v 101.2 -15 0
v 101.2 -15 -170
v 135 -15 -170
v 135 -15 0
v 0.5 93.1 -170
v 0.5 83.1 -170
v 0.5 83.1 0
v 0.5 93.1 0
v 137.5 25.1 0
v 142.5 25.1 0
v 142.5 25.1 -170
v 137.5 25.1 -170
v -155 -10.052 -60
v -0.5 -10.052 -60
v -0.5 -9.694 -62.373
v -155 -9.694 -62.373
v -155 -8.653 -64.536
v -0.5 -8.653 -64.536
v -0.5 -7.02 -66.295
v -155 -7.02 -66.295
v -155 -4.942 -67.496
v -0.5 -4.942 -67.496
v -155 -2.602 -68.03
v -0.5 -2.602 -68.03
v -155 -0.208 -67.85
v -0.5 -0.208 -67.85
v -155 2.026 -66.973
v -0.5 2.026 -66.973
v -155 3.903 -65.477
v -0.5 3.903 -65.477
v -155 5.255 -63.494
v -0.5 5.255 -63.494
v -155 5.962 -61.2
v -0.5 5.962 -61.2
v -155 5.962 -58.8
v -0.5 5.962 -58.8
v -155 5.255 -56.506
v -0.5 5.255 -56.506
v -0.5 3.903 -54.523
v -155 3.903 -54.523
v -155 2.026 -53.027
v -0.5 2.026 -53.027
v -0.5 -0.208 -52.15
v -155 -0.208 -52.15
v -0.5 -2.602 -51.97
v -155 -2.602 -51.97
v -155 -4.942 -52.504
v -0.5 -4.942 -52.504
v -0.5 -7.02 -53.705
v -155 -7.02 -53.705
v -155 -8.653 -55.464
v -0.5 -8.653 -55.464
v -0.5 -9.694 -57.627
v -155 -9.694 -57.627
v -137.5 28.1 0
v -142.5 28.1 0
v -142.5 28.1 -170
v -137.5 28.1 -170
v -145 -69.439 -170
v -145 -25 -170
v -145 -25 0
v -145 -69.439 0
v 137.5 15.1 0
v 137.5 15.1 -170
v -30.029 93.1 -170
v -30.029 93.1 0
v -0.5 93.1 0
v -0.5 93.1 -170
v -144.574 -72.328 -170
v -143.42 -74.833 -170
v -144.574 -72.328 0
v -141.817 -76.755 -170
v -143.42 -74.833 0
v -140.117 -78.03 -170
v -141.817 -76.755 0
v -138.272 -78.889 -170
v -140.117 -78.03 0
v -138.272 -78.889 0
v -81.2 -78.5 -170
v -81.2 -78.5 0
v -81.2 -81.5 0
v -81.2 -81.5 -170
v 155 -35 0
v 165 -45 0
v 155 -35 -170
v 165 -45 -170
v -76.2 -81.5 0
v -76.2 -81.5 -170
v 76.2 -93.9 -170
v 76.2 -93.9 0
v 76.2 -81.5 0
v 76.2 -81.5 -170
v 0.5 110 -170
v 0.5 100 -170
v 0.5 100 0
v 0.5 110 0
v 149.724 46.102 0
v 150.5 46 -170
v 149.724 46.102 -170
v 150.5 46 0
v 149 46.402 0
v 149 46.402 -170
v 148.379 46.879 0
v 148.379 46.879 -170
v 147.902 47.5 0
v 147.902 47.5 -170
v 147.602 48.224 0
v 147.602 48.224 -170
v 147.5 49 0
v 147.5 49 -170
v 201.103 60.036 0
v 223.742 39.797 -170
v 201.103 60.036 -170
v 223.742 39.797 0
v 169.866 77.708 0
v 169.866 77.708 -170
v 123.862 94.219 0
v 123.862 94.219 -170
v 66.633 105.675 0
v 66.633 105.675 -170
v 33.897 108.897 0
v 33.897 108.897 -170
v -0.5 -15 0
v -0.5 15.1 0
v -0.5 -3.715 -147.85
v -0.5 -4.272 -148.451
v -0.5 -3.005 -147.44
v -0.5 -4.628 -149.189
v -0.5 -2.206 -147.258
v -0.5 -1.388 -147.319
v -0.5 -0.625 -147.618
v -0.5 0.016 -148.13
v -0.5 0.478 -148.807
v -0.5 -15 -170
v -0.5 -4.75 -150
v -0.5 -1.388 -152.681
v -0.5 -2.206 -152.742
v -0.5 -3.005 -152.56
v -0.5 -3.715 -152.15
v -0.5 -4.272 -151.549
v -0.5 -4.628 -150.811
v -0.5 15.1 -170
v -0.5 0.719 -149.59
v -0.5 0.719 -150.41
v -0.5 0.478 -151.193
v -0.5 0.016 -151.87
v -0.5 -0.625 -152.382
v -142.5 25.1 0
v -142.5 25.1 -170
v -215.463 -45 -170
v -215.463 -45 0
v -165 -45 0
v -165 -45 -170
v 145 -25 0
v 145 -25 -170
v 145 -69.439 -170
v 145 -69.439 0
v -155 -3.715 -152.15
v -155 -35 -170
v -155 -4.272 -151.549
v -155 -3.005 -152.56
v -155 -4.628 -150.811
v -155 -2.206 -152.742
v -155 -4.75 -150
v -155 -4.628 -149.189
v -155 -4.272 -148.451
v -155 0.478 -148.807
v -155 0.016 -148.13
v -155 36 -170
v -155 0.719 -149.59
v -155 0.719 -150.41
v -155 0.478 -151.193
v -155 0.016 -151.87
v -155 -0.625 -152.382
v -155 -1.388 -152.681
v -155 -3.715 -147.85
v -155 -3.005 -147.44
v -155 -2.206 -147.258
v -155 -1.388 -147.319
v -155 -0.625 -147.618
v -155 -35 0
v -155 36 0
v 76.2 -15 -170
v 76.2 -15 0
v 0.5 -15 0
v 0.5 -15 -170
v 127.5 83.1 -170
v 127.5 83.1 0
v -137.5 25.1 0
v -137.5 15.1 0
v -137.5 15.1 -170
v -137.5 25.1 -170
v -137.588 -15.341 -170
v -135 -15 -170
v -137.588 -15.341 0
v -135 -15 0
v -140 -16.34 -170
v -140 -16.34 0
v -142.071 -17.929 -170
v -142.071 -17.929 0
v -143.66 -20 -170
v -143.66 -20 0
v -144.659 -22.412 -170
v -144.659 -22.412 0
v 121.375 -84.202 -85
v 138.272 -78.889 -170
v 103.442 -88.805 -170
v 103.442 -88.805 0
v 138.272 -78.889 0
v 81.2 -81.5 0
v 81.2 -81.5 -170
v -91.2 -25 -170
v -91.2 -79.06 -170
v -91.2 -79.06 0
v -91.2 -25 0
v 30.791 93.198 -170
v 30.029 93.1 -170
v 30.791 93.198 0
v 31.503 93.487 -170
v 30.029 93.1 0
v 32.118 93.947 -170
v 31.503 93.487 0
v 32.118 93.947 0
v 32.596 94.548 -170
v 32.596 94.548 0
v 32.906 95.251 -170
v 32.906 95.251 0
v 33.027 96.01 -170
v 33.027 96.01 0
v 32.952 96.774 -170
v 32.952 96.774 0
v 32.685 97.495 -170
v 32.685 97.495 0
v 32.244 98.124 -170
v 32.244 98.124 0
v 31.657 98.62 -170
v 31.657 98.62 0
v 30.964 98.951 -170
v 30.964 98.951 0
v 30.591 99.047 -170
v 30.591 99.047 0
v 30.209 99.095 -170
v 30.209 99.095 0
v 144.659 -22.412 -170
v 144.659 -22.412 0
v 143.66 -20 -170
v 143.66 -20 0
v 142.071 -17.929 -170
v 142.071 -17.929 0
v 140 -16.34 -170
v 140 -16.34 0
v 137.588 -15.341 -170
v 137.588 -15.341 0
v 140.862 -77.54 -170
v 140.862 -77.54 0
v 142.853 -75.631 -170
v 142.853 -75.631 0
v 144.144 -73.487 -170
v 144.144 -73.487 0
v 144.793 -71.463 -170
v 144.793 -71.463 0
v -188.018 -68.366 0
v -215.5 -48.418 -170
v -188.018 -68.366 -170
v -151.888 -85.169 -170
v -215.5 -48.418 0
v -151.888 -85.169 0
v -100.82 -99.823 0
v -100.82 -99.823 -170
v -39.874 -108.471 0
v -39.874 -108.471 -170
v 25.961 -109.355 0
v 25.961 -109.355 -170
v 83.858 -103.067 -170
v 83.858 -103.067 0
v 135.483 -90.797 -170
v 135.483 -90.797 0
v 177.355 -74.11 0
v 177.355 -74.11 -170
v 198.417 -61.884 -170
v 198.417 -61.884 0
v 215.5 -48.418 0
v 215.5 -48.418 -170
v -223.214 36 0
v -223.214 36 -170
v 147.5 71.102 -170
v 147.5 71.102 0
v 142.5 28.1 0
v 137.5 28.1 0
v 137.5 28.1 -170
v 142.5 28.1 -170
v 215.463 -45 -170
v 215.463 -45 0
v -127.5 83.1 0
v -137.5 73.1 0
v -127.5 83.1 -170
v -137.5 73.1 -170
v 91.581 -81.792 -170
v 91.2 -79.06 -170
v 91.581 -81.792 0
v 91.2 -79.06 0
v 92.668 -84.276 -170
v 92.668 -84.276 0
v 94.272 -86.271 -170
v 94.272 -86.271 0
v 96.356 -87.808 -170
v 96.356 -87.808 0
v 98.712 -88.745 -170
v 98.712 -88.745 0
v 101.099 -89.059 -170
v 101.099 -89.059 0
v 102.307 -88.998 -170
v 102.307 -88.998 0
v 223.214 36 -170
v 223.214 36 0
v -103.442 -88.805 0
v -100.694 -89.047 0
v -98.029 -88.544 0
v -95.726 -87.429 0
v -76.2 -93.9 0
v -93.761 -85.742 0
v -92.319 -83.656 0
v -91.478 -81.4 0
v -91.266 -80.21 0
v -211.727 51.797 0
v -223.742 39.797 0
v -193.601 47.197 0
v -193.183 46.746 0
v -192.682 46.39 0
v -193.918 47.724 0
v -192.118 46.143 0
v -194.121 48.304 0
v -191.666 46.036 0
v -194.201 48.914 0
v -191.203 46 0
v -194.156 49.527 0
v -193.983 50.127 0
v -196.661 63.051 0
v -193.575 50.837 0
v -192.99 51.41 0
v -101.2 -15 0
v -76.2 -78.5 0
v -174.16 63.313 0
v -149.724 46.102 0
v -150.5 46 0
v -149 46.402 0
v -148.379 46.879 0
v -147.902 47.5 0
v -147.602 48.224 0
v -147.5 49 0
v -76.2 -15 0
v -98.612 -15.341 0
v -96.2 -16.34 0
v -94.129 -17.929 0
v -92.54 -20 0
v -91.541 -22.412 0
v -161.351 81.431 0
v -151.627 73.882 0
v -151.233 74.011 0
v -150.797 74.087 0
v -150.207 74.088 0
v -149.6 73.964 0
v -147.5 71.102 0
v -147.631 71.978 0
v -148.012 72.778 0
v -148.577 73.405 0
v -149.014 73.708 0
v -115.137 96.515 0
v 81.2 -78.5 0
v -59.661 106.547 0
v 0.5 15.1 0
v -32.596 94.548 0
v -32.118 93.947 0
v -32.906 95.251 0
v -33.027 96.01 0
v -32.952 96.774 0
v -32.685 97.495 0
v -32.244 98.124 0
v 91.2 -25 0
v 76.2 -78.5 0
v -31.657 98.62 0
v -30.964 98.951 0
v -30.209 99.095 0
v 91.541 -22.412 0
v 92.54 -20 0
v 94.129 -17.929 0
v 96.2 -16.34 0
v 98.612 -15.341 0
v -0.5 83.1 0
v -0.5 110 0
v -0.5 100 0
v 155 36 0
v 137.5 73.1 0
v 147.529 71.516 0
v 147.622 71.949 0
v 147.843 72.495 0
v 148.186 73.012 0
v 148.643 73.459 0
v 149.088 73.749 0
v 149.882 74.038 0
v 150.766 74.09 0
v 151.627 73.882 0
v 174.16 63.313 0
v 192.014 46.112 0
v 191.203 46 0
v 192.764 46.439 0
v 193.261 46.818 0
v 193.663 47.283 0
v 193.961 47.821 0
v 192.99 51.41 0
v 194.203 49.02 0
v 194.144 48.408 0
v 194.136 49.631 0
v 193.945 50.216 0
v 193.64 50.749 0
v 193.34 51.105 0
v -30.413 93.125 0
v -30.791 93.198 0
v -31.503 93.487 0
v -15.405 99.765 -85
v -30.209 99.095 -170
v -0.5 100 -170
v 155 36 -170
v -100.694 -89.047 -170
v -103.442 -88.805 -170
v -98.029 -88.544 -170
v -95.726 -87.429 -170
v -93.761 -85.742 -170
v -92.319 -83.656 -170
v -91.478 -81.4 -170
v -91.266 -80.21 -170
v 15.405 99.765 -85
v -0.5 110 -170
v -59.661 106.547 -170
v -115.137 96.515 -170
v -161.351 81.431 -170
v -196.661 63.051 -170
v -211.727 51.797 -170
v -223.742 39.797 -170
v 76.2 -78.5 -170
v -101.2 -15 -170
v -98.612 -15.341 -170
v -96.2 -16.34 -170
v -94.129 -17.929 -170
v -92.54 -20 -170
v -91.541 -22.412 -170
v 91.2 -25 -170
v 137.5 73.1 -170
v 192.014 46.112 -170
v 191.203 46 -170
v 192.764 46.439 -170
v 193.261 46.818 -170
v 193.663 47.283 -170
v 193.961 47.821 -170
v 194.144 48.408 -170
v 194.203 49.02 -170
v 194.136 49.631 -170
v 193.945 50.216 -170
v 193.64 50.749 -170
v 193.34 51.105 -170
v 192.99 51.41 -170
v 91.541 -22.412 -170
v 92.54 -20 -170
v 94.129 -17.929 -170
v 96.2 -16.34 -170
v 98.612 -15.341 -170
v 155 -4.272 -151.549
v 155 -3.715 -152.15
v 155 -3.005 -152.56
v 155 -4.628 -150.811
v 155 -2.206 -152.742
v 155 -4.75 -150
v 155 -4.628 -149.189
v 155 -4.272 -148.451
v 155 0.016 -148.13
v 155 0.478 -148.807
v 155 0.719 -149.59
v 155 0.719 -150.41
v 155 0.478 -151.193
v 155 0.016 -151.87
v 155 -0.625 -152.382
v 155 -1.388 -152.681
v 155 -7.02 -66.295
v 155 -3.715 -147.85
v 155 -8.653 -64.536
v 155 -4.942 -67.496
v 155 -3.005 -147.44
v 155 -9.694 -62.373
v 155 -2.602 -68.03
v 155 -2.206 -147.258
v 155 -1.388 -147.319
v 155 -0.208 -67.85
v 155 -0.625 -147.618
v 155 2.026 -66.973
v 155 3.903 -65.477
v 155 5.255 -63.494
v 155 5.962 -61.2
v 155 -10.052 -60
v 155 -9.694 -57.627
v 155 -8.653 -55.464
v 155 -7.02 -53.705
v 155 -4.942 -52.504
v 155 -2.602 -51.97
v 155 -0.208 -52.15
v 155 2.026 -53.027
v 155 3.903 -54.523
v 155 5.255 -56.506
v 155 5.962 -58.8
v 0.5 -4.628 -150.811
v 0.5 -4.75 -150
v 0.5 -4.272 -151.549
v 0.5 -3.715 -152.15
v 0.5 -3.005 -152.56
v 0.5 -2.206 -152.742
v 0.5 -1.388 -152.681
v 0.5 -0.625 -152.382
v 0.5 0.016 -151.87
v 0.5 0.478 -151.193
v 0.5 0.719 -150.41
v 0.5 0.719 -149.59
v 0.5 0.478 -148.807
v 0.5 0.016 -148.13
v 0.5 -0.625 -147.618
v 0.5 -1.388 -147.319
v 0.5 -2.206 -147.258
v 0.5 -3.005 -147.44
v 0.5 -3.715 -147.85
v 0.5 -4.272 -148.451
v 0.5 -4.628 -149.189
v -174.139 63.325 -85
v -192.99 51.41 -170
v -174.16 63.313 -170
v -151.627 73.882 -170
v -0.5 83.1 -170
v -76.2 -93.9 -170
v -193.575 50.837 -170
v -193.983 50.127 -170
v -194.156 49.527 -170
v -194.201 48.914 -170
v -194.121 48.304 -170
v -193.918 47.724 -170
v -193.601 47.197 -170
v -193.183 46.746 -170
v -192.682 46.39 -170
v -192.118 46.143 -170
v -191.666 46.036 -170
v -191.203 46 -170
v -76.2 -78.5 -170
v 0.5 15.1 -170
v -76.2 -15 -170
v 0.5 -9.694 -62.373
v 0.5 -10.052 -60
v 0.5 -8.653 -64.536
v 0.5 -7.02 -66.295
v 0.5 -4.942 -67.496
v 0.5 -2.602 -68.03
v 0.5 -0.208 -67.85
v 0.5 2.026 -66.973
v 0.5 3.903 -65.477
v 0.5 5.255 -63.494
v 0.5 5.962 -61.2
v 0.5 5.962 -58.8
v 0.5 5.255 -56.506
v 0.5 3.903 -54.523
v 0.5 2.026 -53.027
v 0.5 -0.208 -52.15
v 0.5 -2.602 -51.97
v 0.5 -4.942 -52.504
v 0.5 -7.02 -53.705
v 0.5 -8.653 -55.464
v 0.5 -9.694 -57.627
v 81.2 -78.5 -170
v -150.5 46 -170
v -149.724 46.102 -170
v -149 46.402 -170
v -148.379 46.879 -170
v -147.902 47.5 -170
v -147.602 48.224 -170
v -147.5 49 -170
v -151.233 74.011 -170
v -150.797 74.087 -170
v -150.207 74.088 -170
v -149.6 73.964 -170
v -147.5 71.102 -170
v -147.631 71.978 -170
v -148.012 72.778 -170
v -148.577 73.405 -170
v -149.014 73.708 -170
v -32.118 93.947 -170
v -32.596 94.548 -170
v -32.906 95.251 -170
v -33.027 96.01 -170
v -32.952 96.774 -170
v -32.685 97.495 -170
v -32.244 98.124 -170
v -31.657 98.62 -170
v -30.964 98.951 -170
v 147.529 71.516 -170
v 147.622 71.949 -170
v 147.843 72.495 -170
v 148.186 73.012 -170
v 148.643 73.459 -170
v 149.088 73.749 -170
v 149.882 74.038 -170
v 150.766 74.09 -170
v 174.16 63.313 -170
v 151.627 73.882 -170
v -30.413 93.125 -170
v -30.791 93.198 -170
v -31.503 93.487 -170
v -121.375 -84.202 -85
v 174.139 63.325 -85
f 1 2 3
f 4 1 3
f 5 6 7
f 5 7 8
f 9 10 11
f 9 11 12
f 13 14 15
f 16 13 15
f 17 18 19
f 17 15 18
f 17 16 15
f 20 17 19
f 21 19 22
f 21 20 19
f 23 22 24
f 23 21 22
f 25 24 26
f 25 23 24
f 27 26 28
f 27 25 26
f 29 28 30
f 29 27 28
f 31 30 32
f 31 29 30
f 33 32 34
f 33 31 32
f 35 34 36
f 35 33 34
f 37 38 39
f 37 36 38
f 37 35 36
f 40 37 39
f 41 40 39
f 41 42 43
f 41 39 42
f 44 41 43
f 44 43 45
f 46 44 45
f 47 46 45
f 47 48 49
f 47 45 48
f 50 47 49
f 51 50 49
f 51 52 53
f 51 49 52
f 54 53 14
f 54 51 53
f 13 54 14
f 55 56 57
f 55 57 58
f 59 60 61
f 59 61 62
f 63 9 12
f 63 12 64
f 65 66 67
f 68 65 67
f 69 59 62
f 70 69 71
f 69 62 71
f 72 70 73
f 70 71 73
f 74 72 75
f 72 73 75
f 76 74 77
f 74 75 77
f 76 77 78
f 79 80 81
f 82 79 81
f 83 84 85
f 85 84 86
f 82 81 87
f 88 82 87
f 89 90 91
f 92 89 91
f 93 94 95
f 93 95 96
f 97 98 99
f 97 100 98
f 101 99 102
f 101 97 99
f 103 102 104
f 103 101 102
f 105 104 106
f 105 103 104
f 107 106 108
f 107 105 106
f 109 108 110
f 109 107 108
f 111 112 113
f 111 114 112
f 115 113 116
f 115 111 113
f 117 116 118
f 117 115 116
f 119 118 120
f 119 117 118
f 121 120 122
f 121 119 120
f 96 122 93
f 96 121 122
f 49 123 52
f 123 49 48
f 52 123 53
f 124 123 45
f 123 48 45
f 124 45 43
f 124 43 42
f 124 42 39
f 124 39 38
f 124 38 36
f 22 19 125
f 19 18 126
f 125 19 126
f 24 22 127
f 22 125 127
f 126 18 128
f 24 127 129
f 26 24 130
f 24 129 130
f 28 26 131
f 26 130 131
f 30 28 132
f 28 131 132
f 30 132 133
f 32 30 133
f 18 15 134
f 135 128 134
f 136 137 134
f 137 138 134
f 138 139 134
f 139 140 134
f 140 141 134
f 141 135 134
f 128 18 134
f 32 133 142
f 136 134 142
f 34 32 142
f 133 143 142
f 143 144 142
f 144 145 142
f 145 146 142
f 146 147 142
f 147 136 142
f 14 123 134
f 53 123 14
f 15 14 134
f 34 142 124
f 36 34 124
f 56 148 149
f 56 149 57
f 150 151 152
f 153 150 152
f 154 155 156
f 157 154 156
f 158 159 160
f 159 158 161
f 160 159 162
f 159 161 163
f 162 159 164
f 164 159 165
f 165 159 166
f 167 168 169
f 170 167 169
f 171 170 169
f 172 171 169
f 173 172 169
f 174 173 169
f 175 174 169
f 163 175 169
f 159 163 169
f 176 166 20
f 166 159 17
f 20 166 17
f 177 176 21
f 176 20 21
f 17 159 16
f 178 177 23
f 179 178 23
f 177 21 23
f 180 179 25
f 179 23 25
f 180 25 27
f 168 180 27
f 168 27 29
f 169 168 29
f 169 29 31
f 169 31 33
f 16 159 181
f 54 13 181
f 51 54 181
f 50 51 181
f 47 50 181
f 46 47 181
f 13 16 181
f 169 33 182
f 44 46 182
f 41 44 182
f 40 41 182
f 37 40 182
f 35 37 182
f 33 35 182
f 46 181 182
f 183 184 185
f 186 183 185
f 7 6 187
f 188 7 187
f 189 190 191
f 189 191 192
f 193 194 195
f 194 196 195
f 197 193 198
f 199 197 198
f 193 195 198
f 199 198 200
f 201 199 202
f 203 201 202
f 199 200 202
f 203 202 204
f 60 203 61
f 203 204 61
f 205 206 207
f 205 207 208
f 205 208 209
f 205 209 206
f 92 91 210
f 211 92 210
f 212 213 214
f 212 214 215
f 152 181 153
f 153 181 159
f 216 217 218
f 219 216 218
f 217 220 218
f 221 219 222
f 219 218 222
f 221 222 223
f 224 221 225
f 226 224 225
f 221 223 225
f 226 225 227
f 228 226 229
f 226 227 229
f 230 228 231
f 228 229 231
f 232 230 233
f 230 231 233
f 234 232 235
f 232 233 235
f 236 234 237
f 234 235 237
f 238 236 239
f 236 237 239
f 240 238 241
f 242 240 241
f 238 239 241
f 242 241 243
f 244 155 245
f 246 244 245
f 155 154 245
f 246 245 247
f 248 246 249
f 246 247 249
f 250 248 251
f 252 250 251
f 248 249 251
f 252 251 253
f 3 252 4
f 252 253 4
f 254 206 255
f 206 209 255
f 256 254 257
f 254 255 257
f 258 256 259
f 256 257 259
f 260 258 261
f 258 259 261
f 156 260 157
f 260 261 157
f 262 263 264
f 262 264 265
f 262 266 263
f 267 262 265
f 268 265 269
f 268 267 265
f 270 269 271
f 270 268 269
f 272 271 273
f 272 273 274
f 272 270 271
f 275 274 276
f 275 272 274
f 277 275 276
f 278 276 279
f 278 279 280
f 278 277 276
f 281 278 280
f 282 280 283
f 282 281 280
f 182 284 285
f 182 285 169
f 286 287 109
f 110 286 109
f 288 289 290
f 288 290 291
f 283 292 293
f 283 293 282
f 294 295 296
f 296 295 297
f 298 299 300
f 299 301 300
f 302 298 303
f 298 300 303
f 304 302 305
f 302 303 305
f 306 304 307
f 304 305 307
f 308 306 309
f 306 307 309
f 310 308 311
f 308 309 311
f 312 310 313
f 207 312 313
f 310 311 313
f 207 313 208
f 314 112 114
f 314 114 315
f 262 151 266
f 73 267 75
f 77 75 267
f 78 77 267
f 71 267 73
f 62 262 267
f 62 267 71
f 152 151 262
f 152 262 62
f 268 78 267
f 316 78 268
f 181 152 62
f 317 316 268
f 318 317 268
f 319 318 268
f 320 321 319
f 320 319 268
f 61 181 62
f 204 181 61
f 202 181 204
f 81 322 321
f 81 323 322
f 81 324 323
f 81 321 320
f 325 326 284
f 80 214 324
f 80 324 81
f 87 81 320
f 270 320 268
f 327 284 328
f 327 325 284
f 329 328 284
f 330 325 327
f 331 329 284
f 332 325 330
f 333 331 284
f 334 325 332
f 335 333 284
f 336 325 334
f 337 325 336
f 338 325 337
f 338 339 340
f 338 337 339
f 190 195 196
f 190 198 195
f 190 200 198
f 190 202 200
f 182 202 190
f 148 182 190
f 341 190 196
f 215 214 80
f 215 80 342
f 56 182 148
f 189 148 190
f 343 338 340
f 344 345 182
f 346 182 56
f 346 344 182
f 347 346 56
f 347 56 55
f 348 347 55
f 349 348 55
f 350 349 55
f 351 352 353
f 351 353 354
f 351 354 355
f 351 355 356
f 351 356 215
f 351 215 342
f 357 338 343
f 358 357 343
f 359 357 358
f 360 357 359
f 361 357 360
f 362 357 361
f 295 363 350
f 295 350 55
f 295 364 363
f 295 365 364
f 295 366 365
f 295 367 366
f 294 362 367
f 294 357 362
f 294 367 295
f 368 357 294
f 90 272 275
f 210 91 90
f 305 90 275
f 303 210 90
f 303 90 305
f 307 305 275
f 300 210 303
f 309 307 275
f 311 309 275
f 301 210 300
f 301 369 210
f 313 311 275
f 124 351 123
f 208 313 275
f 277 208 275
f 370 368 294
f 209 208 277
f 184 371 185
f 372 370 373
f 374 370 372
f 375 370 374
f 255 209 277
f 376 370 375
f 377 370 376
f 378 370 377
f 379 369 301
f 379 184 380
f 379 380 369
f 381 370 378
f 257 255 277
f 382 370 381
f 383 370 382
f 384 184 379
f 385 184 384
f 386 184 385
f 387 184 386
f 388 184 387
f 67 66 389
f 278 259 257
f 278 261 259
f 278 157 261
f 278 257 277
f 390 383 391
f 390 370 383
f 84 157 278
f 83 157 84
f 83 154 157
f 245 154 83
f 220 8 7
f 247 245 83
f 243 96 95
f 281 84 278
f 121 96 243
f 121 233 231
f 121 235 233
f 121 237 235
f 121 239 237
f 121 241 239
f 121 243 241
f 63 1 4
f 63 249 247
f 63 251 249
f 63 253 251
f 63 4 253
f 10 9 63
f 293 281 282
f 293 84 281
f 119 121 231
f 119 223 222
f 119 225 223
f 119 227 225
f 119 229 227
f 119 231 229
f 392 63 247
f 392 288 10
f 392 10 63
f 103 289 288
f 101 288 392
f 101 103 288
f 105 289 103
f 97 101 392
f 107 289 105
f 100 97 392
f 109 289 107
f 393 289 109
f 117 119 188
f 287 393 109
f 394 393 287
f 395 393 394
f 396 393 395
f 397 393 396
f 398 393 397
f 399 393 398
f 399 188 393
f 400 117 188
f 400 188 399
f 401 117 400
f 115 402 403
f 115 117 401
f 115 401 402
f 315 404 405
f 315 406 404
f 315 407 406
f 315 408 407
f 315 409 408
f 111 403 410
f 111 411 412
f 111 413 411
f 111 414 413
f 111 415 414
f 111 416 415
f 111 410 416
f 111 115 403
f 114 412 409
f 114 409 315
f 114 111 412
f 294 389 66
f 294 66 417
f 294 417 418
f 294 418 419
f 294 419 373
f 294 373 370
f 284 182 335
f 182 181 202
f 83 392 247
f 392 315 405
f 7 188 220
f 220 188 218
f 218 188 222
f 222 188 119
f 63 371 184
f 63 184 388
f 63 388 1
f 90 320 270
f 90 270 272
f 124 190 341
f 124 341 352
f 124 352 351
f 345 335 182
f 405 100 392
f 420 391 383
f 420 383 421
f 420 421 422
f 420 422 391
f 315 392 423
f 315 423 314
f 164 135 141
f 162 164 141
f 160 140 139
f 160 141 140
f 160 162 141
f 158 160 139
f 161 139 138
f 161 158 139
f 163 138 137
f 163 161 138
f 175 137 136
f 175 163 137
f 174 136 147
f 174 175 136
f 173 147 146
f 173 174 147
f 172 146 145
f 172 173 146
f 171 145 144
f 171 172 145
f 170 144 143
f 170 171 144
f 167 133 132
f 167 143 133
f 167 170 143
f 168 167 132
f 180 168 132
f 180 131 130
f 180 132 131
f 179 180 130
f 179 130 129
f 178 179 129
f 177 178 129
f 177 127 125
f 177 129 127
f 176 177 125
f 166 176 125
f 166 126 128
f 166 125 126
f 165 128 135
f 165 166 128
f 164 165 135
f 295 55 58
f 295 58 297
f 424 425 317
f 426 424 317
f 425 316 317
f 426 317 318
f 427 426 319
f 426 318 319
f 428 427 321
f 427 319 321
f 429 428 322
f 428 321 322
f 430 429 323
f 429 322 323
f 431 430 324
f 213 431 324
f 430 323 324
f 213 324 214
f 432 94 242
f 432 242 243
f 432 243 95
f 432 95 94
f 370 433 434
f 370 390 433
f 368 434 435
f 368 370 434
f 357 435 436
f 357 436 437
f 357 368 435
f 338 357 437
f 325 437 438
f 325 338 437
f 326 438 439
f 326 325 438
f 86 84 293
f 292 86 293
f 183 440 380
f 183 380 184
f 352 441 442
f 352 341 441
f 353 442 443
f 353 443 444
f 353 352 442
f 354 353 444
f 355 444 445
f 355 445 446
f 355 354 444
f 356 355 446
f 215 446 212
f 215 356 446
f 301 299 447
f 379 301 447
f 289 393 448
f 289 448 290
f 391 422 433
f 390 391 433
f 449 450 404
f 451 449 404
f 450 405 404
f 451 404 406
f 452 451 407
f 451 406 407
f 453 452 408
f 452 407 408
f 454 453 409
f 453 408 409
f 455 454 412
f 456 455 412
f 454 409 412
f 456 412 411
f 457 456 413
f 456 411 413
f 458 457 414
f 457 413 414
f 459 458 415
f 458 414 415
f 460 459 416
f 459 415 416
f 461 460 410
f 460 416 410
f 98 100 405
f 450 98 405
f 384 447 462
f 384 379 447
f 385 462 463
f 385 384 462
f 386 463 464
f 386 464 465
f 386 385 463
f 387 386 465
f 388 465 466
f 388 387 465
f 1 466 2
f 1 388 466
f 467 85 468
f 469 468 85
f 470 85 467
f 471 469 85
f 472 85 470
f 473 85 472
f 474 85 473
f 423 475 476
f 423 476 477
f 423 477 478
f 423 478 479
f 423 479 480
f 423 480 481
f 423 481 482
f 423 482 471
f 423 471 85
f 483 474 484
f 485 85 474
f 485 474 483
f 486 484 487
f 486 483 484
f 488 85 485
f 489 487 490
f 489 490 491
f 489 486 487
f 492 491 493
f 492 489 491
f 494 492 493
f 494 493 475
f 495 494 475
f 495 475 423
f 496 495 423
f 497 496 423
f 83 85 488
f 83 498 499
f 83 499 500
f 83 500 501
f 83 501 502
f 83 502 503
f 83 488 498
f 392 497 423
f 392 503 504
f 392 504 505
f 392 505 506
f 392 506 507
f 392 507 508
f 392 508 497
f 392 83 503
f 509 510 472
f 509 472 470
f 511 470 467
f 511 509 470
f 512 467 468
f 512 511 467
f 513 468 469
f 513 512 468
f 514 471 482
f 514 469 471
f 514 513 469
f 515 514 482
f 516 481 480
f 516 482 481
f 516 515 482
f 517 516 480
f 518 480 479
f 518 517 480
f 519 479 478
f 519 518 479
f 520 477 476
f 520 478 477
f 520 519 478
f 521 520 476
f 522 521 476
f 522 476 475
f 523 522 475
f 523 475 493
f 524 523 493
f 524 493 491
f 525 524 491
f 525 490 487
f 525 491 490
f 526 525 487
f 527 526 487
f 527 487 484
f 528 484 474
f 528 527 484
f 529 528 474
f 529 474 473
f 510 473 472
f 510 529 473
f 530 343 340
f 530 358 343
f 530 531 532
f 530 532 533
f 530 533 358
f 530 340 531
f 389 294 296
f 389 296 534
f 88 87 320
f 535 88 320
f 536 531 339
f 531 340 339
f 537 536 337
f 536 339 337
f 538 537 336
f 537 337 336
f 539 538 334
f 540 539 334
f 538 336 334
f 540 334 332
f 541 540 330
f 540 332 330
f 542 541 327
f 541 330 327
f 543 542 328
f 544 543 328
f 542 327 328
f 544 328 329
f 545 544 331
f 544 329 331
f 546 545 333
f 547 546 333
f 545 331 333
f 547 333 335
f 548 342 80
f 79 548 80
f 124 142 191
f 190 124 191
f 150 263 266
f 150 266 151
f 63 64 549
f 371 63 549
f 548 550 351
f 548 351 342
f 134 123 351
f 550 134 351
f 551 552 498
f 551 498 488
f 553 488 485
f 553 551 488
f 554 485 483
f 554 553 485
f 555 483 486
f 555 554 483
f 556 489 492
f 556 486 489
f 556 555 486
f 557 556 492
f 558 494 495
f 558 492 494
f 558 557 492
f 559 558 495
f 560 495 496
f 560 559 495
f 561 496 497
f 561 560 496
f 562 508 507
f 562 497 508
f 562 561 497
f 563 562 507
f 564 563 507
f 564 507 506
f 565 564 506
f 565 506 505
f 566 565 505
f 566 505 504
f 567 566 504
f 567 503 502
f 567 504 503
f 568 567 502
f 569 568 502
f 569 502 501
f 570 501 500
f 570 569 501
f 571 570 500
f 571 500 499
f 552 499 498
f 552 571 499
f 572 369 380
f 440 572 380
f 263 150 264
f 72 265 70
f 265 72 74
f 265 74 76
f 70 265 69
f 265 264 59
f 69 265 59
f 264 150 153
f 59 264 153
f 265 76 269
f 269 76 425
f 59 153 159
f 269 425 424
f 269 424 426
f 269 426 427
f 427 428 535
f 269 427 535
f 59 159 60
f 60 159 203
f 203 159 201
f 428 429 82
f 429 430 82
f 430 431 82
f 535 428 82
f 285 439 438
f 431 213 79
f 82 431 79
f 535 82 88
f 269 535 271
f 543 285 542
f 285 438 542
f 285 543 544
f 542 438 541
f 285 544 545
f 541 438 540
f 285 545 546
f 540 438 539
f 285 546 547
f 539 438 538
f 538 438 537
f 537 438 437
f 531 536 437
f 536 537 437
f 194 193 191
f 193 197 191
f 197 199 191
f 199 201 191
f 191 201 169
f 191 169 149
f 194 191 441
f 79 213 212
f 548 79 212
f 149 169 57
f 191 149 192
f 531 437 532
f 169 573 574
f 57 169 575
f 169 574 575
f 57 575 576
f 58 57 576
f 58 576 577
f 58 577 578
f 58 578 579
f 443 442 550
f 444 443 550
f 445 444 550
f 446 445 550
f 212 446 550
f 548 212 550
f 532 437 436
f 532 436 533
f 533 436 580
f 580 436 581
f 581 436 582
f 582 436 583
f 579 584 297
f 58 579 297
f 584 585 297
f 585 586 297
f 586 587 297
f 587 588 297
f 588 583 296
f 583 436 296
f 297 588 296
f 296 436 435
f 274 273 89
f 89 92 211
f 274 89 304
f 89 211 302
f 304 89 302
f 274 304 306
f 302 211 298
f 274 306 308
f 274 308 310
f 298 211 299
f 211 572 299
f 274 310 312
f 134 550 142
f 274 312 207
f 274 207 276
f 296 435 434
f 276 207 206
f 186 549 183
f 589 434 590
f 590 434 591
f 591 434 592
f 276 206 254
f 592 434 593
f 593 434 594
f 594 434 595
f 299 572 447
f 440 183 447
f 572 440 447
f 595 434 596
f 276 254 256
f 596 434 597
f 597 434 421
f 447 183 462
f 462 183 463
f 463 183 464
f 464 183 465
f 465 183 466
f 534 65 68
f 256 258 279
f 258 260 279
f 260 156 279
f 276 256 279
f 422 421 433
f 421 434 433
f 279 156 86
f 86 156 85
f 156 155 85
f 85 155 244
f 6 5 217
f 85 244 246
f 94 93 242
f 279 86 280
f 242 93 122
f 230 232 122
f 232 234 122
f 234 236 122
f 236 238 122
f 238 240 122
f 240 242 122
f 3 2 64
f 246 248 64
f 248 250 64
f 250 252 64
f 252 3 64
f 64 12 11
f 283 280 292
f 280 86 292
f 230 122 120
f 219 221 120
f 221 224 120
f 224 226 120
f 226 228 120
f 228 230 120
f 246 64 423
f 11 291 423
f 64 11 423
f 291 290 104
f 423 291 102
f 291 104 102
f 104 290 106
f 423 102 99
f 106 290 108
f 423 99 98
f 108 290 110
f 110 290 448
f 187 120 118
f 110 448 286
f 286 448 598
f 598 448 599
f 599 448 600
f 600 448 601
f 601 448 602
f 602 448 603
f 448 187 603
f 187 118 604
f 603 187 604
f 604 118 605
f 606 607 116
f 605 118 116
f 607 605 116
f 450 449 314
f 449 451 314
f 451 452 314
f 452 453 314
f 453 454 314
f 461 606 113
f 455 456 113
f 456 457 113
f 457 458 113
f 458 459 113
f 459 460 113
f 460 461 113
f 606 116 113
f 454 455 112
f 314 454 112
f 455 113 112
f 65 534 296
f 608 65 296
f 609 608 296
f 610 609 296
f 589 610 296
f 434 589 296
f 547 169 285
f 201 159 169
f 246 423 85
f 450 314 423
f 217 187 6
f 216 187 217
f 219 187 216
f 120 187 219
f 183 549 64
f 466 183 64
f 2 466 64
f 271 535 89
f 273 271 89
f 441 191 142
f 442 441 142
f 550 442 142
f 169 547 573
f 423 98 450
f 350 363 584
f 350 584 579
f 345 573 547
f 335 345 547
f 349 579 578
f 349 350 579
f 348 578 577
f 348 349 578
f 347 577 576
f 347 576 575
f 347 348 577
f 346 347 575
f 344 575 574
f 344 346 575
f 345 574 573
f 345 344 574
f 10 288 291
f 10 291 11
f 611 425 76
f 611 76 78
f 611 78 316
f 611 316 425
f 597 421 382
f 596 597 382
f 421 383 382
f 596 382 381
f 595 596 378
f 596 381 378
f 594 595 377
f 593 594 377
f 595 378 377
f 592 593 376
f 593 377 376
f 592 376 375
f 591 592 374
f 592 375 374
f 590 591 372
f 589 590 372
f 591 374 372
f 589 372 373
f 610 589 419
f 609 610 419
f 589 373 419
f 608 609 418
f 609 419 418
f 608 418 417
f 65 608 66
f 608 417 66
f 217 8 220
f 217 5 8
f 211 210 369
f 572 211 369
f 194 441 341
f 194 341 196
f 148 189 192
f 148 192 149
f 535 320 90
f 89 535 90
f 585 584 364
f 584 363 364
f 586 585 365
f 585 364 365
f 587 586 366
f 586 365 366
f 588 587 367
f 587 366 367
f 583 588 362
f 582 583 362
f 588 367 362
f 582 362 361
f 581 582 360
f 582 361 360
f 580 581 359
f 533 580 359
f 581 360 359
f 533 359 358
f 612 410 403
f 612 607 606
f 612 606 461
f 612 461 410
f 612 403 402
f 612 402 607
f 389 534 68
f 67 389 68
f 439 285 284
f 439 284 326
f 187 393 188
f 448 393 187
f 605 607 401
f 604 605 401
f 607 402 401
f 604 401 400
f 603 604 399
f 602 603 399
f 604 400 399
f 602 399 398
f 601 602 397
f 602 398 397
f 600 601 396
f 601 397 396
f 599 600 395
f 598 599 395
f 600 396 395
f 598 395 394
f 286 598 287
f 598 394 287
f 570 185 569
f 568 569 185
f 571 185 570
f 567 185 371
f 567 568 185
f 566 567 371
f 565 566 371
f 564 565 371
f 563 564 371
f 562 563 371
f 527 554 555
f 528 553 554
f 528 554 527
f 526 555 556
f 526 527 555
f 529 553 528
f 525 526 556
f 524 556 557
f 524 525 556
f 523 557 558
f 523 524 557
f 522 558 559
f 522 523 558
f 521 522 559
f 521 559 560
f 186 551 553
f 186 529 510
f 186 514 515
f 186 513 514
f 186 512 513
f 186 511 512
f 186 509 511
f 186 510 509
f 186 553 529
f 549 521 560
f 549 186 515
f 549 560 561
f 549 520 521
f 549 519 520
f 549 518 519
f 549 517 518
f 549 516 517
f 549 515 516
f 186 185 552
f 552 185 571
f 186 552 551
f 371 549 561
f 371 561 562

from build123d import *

# Parameters (mm, degrees)
SKETCH1_RX              = 240
SKETCH1_RY              = 110
BOSS_EXTRUDE1_DEPTH     = 170
SKETCH9_W               = 85
SKETCH9_H               = 81
CUT_EXTRUDE4_DEPTH      = 315.006369362
CUT_EXTRUDE5_DEPTH      = 305.024031405
CUT_EXTRUDE6_DEPTH      = 305.024031405
CUT_EXTRUDE6_DEPTH_BACK = 305.024031405
SKETCH11_R              = 8.05220018
SKETCH11_R_2            = 2.75
CHAMFER1_START          = -171
CHAMFER1_DEPTH          = 172
CUT_EXTRUDE7_DEPTH      = 302.762319701
CHAMFER2_SIZE           = 10
CUT_EXTRUDE8_DEPTH      = 302.762319701
CUT_EXTRUDE8_DEPTH_BACK = 302.762319701
SKETCH14_W              = 1
SKETCH14_H              = 125
CUT_EXTRUDE9_DEPTH      = 302.762319832
CUT_EXTRUDE9_DEPTH_BACK = 302.762319832
FILLET1_R               = 10
FILLET2_R               = 3
CHAMFER4_SIZE           = 10


with BuildPart() as part:
    # Sketch1 → Boss-Extrude1 (new body)
    with BuildSketch(Plane.XY):
        with Locations((0, 0)):
            Ellipse(SKETCH1_RX, SKETCH1_RY)
    extrude(amount=-BOSS_EXTRUDE1_DEPTH)

    # Sketch9 → Cut-Extrude4 (cut, through all)
    with BuildSketch(Plane.XY):
        with Locations((197.5, -4.5)):
            Rectangle(SKETCH9_W, SKETCH9_H)
        with Locations((-197.5, -4.5)):
            Rectangle(SKETCH9_W, SKETCH9_H)
    extrude(amount=-CUT_EXTRUDE4_DEPTH, mode=Mode.SUBTRACT)

    # Sketch10 → Cut-Extrude5 (cut, through all)
    with BuildSketch(Plane.XY):
        Polygon((-137.5, 83.1), (137.5, 83.1), (137.5, 28.1), (142.5, 28.1), (142.5, 25.1), (137.5, 25.1), (137.5, 15.1), (-137.5, 15.1), (-137.5, 25.1), (-142.5, 25.1), (-142.5, 28.1), (-137.5, 28.1), align=None)
    extrude(amount=-CUT_EXTRUDE5_DEPTH, mode=Mode.SUBTRACT)

    # Sketch11 → Cut-Extrude6 (cut, two sides: drawn at the far end of the back side and taken through both)
    with BuildSketch(Plane(origin=(0, 0, 0), x_dir=(0, 0, -1), z_dir=(1, 0, 0)).offset(-CUT_EXTRUDE6_DEPTH_BACK)):
        with Locations(Location((60, -2, 0), (0, 0, 270))):
            Circle(SKETCH11_R)
        with Locations(Location((150, -2, 0), (0, 0, 270))):
            Circle(SKETCH11_R_2)
    extrude(amount=CUT_EXTRUDE6_DEPTH + CUT_EXTRUDE6_DEPTH_BACK, mode=Mode.SUBTRACT)

    # Chamfer1: read off the stored shape, not the designer's step
    # Chamfer1 outline → Chamfer1 (cut)
    with BuildSketch(Plane.XY.offset(CHAMFER1_START)):
        with BuildLine():
            add(Edge.make_bspline(
                [(226.783181851, 36), (225.338784139, 37.911428345), (223.742033582, 39.797224556)],
                knots=[0.33341591, 0.33341591, 0.33341591, 0.380954959, 0.380954959, 0.380954959], degree=2, weights=[1, 0.98707721, 0.974650902]))
            Line((223.742033582, 39.797224556), (223.213573476, 36))
            Line((223.213573476, 36), (226.783181851, 36))
        make_face()
        with BuildLine():
            Line((-223.213573476, 36), (-223.742033582, 39.797224556))
            add(Edge.make_bspline(
                [(-223.742033582, 39.797224556), (-225.338784139, 37.911428345), (-226.783181851, 36)],
                knots=[2.760637694, 2.760637694, 2.760637694, 2.808176743, 2.808176743, 2.808176743], degree=2, weights=[0.974650902, 0.98707721, 1]))
            Line((-226.783181851, 36), (-223.213573476, 36))
        make_face()
        with BuildLine():
            add(Edge.make_bspline(
                [(-218.998471635, -45), (-217.313455553, -46.722643886), (-215.500461662, -48.417772396)],
                knots=[3.563050222, 3.563050222, 3.563050222, 3.605808591, 3.605808591, 3.605808591], degree=2, weights=[1, 0.989008328, 0.978425575]))
            Line((-215.500461662, -48.417772396), (-215.462722195, -45))
            Line((-215.462722195, -45), (-218.998471635, -45))
        make_face()
        with BuildLine():
            Line((215.462722195, -45), (215.500461662, -48.417772396))
            add(Edge.make_bspline(
                [(215.500461662, -48.417772396), (217.313455553, -46.722643886), (218.998471635, -45)],
                knots=[5.818969369, 5.818969369, 5.818969369, 5.861727739, 5.861727739, 5.861727739], degree=2, weights=[0.978425575, 0.989008328, 1]))
            Line((218.998471635, -45), (215.462722195, -45))
        make_face()
    extrude(amount=CHAMFER1_DEPTH, mode=Mode.SUBTRACT)

    # Sketch13 → Cut-Extrude7 (cut, through all)
    with BuildSketch(Plane.XY):
        Polygon((-76.2, -81.5), (-76.2, -93.9), (76.2, -93.9), (76.2, -81.5), (81.2, -81.5), (81.2, -78.5), (76.2, -78.5), (76.2, -15), (-76.2, -15), (-76.2, -78.5), (-81.2, -78.5), (-81.2, -81.5), align=None)
    extrude(amount=-CUT_EXTRUDE7_DEPTH, mode=Mode.SUBTRACT)

    # Chamfer2
    chamfer2_edges = [part.edges().sort_by_distance(p)[0] for p in [
        (155, -45, -85),
        (-155, -45, -85),
    ]]
    chamfer(chamfer2_edges, length=CHAMFER2_SIZE)

    # Sketch14 → Cut-Extrude8 (cut, two sides: drawn at the far end of the back side and taken through both)
    with BuildSketch(Plane.XY.offset(-CUT_EXTRUDE8_DEPTH_BACK)):
        with Locations((0, 47.5)):
            Rectangle(SKETCH14_W, SKETCH14_H)
    extrude(amount=CUT_EXTRUDE8_DEPTH + CUT_EXTRUDE8_DEPTH_BACK, mode=Mode.SUBTRACT)

    # Sketch15 → Cut-Extrude9 (cut, two sides: drawn at the far end of the back side and taken through both)
    with BuildSketch(Plane.XY.offset(-CUT_EXTRUDE9_DEPTH_BACK)):
        with BuildLine():
            Line((147.5, 75.514694834), (147.5, 46))
            Line((147.5, 46), (199.781755924, 46))
            add(Edge.make_bspline(
                [(199.781755924, 46), (179.990233789, 62.979001801), (147.5, 75.514694834)],
                knots=[3.619587852, 3.619587852, 3.619587852, 3.997470903, 3.997470903, 3.997470903], degree=2, weights=[1, 0.982203587, 1]))
        make_face()
        with BuildLine():
            Line((91.2, -91.41689608), (91.2, -15))
            Line((91.2, -15), (145, -15))
            Line((145, -15), (145, -76.465113485))
            add(Edge.make_bspline(
                [(91.2, -91.41689608), (120.495747781, -85.643811522), (145, -76.465113485)],
                knots=[1.988139758, 1.988139758, 1.988139758, 2.27109284, 2.27109284, 2.27109284], degree=2, weights=[1, 0.990008876, 1]))
        make_face()
        with BuildLine():
            Line((-82.129314955, 93.1), (82.129314955, 93.1))
            add(Edge.make_bspline(
                [(82.129314955, 93.1), (0, 107.411385607), (-82.129314955, 93.1)],
                knots=[4.338735578, 4.338735578, 4.338735578, 5.086042382, 5.086042382, 5.086042382], degree=2, weights=[1, 0.931, 1]))
        make_face()
        with BuildLine():
            Line((-91.2, -91.41689608), (-91.2, -15))
            Line((-91.2, -15), (-145, -15))
            Line((-145, -15), (-145, -76.465113485))
            add(Edge.make_bspline(
                [(-145, -76.465113485), (-120.495747781, -85.643811522), (-91.2, -91.41689608)],
                knots=[0.870499814, 0.870499814, 0.870499814, 1.153452896, 1.153452896, 1.153452896], degree=2, weights=[1, 0.990008876, 1]))
        make_face()
        with BuildLine():
            Line((-147.5, 75.514694834), (-147.5, 46))
            Line((-147.5, 46), (-199.781755924, 46))
            add(Edge.make_bspline(
                [(-147.5, 75.514694834), (-179.990233789, 62.979001801), (-199.781755924, 46)],
                knots=[5.427307058, 5.427307058, 5.427307058, 5.805190109, 5.805190109, 5.805190109], degree=2, weights=[1, 0.982203587, 1]))
        make_face()
    extrude(amount=CUT_EXTRUDE9_DEPTH + CUT_EXTRUDE9_DEPTH_BACK, mode=Mode.SUBTRACT)

    # Fillet1
    fillet1_edges = [part.edges().sort_by_distance(p)[0] for p in [
        (-145, -15, -85),
        (-145, -76.465113485, -85),
        (-91.2, -91.41689608, -85),
        (145, -76.465113485, -85),
        (91.2, -91.41689608, -85),
        (91.2, -15, -85),
        (-91.2, -15, -85),
        (145, -15, -85),
    ]]
    fillet(fillet1_edges, radius=FILLET1_R)

    # Fillet2
    fillet2_edges = [part.edges().sort_by_distance(p)[0] for p in [
        (-82.129314955, 93.1, -85),
        (82.129314955, 93.1, -85),
        (199.781755924, 46, -85),
        (147.5, 75.514694834, -85),
        (147.5, 46, -85),
        (-147.5, 75.514694834, -85),
        (-147.5, 46, -85),
        (-199.781755924, 46, -85),
    ]]
    fillet(fillet2_edges, radius=FILLET2_R)

    # Chamfer4
    chamfer4_edges = [part.edges().sort_by_distance(p)[0] for p in [
        (-137.5, 83.1, -85),
        (137.5, 83.1, -85),
    ]]
    chamfer(chamfer4_edges, length=CHAMFER4_SIZE)


solid = part.part
